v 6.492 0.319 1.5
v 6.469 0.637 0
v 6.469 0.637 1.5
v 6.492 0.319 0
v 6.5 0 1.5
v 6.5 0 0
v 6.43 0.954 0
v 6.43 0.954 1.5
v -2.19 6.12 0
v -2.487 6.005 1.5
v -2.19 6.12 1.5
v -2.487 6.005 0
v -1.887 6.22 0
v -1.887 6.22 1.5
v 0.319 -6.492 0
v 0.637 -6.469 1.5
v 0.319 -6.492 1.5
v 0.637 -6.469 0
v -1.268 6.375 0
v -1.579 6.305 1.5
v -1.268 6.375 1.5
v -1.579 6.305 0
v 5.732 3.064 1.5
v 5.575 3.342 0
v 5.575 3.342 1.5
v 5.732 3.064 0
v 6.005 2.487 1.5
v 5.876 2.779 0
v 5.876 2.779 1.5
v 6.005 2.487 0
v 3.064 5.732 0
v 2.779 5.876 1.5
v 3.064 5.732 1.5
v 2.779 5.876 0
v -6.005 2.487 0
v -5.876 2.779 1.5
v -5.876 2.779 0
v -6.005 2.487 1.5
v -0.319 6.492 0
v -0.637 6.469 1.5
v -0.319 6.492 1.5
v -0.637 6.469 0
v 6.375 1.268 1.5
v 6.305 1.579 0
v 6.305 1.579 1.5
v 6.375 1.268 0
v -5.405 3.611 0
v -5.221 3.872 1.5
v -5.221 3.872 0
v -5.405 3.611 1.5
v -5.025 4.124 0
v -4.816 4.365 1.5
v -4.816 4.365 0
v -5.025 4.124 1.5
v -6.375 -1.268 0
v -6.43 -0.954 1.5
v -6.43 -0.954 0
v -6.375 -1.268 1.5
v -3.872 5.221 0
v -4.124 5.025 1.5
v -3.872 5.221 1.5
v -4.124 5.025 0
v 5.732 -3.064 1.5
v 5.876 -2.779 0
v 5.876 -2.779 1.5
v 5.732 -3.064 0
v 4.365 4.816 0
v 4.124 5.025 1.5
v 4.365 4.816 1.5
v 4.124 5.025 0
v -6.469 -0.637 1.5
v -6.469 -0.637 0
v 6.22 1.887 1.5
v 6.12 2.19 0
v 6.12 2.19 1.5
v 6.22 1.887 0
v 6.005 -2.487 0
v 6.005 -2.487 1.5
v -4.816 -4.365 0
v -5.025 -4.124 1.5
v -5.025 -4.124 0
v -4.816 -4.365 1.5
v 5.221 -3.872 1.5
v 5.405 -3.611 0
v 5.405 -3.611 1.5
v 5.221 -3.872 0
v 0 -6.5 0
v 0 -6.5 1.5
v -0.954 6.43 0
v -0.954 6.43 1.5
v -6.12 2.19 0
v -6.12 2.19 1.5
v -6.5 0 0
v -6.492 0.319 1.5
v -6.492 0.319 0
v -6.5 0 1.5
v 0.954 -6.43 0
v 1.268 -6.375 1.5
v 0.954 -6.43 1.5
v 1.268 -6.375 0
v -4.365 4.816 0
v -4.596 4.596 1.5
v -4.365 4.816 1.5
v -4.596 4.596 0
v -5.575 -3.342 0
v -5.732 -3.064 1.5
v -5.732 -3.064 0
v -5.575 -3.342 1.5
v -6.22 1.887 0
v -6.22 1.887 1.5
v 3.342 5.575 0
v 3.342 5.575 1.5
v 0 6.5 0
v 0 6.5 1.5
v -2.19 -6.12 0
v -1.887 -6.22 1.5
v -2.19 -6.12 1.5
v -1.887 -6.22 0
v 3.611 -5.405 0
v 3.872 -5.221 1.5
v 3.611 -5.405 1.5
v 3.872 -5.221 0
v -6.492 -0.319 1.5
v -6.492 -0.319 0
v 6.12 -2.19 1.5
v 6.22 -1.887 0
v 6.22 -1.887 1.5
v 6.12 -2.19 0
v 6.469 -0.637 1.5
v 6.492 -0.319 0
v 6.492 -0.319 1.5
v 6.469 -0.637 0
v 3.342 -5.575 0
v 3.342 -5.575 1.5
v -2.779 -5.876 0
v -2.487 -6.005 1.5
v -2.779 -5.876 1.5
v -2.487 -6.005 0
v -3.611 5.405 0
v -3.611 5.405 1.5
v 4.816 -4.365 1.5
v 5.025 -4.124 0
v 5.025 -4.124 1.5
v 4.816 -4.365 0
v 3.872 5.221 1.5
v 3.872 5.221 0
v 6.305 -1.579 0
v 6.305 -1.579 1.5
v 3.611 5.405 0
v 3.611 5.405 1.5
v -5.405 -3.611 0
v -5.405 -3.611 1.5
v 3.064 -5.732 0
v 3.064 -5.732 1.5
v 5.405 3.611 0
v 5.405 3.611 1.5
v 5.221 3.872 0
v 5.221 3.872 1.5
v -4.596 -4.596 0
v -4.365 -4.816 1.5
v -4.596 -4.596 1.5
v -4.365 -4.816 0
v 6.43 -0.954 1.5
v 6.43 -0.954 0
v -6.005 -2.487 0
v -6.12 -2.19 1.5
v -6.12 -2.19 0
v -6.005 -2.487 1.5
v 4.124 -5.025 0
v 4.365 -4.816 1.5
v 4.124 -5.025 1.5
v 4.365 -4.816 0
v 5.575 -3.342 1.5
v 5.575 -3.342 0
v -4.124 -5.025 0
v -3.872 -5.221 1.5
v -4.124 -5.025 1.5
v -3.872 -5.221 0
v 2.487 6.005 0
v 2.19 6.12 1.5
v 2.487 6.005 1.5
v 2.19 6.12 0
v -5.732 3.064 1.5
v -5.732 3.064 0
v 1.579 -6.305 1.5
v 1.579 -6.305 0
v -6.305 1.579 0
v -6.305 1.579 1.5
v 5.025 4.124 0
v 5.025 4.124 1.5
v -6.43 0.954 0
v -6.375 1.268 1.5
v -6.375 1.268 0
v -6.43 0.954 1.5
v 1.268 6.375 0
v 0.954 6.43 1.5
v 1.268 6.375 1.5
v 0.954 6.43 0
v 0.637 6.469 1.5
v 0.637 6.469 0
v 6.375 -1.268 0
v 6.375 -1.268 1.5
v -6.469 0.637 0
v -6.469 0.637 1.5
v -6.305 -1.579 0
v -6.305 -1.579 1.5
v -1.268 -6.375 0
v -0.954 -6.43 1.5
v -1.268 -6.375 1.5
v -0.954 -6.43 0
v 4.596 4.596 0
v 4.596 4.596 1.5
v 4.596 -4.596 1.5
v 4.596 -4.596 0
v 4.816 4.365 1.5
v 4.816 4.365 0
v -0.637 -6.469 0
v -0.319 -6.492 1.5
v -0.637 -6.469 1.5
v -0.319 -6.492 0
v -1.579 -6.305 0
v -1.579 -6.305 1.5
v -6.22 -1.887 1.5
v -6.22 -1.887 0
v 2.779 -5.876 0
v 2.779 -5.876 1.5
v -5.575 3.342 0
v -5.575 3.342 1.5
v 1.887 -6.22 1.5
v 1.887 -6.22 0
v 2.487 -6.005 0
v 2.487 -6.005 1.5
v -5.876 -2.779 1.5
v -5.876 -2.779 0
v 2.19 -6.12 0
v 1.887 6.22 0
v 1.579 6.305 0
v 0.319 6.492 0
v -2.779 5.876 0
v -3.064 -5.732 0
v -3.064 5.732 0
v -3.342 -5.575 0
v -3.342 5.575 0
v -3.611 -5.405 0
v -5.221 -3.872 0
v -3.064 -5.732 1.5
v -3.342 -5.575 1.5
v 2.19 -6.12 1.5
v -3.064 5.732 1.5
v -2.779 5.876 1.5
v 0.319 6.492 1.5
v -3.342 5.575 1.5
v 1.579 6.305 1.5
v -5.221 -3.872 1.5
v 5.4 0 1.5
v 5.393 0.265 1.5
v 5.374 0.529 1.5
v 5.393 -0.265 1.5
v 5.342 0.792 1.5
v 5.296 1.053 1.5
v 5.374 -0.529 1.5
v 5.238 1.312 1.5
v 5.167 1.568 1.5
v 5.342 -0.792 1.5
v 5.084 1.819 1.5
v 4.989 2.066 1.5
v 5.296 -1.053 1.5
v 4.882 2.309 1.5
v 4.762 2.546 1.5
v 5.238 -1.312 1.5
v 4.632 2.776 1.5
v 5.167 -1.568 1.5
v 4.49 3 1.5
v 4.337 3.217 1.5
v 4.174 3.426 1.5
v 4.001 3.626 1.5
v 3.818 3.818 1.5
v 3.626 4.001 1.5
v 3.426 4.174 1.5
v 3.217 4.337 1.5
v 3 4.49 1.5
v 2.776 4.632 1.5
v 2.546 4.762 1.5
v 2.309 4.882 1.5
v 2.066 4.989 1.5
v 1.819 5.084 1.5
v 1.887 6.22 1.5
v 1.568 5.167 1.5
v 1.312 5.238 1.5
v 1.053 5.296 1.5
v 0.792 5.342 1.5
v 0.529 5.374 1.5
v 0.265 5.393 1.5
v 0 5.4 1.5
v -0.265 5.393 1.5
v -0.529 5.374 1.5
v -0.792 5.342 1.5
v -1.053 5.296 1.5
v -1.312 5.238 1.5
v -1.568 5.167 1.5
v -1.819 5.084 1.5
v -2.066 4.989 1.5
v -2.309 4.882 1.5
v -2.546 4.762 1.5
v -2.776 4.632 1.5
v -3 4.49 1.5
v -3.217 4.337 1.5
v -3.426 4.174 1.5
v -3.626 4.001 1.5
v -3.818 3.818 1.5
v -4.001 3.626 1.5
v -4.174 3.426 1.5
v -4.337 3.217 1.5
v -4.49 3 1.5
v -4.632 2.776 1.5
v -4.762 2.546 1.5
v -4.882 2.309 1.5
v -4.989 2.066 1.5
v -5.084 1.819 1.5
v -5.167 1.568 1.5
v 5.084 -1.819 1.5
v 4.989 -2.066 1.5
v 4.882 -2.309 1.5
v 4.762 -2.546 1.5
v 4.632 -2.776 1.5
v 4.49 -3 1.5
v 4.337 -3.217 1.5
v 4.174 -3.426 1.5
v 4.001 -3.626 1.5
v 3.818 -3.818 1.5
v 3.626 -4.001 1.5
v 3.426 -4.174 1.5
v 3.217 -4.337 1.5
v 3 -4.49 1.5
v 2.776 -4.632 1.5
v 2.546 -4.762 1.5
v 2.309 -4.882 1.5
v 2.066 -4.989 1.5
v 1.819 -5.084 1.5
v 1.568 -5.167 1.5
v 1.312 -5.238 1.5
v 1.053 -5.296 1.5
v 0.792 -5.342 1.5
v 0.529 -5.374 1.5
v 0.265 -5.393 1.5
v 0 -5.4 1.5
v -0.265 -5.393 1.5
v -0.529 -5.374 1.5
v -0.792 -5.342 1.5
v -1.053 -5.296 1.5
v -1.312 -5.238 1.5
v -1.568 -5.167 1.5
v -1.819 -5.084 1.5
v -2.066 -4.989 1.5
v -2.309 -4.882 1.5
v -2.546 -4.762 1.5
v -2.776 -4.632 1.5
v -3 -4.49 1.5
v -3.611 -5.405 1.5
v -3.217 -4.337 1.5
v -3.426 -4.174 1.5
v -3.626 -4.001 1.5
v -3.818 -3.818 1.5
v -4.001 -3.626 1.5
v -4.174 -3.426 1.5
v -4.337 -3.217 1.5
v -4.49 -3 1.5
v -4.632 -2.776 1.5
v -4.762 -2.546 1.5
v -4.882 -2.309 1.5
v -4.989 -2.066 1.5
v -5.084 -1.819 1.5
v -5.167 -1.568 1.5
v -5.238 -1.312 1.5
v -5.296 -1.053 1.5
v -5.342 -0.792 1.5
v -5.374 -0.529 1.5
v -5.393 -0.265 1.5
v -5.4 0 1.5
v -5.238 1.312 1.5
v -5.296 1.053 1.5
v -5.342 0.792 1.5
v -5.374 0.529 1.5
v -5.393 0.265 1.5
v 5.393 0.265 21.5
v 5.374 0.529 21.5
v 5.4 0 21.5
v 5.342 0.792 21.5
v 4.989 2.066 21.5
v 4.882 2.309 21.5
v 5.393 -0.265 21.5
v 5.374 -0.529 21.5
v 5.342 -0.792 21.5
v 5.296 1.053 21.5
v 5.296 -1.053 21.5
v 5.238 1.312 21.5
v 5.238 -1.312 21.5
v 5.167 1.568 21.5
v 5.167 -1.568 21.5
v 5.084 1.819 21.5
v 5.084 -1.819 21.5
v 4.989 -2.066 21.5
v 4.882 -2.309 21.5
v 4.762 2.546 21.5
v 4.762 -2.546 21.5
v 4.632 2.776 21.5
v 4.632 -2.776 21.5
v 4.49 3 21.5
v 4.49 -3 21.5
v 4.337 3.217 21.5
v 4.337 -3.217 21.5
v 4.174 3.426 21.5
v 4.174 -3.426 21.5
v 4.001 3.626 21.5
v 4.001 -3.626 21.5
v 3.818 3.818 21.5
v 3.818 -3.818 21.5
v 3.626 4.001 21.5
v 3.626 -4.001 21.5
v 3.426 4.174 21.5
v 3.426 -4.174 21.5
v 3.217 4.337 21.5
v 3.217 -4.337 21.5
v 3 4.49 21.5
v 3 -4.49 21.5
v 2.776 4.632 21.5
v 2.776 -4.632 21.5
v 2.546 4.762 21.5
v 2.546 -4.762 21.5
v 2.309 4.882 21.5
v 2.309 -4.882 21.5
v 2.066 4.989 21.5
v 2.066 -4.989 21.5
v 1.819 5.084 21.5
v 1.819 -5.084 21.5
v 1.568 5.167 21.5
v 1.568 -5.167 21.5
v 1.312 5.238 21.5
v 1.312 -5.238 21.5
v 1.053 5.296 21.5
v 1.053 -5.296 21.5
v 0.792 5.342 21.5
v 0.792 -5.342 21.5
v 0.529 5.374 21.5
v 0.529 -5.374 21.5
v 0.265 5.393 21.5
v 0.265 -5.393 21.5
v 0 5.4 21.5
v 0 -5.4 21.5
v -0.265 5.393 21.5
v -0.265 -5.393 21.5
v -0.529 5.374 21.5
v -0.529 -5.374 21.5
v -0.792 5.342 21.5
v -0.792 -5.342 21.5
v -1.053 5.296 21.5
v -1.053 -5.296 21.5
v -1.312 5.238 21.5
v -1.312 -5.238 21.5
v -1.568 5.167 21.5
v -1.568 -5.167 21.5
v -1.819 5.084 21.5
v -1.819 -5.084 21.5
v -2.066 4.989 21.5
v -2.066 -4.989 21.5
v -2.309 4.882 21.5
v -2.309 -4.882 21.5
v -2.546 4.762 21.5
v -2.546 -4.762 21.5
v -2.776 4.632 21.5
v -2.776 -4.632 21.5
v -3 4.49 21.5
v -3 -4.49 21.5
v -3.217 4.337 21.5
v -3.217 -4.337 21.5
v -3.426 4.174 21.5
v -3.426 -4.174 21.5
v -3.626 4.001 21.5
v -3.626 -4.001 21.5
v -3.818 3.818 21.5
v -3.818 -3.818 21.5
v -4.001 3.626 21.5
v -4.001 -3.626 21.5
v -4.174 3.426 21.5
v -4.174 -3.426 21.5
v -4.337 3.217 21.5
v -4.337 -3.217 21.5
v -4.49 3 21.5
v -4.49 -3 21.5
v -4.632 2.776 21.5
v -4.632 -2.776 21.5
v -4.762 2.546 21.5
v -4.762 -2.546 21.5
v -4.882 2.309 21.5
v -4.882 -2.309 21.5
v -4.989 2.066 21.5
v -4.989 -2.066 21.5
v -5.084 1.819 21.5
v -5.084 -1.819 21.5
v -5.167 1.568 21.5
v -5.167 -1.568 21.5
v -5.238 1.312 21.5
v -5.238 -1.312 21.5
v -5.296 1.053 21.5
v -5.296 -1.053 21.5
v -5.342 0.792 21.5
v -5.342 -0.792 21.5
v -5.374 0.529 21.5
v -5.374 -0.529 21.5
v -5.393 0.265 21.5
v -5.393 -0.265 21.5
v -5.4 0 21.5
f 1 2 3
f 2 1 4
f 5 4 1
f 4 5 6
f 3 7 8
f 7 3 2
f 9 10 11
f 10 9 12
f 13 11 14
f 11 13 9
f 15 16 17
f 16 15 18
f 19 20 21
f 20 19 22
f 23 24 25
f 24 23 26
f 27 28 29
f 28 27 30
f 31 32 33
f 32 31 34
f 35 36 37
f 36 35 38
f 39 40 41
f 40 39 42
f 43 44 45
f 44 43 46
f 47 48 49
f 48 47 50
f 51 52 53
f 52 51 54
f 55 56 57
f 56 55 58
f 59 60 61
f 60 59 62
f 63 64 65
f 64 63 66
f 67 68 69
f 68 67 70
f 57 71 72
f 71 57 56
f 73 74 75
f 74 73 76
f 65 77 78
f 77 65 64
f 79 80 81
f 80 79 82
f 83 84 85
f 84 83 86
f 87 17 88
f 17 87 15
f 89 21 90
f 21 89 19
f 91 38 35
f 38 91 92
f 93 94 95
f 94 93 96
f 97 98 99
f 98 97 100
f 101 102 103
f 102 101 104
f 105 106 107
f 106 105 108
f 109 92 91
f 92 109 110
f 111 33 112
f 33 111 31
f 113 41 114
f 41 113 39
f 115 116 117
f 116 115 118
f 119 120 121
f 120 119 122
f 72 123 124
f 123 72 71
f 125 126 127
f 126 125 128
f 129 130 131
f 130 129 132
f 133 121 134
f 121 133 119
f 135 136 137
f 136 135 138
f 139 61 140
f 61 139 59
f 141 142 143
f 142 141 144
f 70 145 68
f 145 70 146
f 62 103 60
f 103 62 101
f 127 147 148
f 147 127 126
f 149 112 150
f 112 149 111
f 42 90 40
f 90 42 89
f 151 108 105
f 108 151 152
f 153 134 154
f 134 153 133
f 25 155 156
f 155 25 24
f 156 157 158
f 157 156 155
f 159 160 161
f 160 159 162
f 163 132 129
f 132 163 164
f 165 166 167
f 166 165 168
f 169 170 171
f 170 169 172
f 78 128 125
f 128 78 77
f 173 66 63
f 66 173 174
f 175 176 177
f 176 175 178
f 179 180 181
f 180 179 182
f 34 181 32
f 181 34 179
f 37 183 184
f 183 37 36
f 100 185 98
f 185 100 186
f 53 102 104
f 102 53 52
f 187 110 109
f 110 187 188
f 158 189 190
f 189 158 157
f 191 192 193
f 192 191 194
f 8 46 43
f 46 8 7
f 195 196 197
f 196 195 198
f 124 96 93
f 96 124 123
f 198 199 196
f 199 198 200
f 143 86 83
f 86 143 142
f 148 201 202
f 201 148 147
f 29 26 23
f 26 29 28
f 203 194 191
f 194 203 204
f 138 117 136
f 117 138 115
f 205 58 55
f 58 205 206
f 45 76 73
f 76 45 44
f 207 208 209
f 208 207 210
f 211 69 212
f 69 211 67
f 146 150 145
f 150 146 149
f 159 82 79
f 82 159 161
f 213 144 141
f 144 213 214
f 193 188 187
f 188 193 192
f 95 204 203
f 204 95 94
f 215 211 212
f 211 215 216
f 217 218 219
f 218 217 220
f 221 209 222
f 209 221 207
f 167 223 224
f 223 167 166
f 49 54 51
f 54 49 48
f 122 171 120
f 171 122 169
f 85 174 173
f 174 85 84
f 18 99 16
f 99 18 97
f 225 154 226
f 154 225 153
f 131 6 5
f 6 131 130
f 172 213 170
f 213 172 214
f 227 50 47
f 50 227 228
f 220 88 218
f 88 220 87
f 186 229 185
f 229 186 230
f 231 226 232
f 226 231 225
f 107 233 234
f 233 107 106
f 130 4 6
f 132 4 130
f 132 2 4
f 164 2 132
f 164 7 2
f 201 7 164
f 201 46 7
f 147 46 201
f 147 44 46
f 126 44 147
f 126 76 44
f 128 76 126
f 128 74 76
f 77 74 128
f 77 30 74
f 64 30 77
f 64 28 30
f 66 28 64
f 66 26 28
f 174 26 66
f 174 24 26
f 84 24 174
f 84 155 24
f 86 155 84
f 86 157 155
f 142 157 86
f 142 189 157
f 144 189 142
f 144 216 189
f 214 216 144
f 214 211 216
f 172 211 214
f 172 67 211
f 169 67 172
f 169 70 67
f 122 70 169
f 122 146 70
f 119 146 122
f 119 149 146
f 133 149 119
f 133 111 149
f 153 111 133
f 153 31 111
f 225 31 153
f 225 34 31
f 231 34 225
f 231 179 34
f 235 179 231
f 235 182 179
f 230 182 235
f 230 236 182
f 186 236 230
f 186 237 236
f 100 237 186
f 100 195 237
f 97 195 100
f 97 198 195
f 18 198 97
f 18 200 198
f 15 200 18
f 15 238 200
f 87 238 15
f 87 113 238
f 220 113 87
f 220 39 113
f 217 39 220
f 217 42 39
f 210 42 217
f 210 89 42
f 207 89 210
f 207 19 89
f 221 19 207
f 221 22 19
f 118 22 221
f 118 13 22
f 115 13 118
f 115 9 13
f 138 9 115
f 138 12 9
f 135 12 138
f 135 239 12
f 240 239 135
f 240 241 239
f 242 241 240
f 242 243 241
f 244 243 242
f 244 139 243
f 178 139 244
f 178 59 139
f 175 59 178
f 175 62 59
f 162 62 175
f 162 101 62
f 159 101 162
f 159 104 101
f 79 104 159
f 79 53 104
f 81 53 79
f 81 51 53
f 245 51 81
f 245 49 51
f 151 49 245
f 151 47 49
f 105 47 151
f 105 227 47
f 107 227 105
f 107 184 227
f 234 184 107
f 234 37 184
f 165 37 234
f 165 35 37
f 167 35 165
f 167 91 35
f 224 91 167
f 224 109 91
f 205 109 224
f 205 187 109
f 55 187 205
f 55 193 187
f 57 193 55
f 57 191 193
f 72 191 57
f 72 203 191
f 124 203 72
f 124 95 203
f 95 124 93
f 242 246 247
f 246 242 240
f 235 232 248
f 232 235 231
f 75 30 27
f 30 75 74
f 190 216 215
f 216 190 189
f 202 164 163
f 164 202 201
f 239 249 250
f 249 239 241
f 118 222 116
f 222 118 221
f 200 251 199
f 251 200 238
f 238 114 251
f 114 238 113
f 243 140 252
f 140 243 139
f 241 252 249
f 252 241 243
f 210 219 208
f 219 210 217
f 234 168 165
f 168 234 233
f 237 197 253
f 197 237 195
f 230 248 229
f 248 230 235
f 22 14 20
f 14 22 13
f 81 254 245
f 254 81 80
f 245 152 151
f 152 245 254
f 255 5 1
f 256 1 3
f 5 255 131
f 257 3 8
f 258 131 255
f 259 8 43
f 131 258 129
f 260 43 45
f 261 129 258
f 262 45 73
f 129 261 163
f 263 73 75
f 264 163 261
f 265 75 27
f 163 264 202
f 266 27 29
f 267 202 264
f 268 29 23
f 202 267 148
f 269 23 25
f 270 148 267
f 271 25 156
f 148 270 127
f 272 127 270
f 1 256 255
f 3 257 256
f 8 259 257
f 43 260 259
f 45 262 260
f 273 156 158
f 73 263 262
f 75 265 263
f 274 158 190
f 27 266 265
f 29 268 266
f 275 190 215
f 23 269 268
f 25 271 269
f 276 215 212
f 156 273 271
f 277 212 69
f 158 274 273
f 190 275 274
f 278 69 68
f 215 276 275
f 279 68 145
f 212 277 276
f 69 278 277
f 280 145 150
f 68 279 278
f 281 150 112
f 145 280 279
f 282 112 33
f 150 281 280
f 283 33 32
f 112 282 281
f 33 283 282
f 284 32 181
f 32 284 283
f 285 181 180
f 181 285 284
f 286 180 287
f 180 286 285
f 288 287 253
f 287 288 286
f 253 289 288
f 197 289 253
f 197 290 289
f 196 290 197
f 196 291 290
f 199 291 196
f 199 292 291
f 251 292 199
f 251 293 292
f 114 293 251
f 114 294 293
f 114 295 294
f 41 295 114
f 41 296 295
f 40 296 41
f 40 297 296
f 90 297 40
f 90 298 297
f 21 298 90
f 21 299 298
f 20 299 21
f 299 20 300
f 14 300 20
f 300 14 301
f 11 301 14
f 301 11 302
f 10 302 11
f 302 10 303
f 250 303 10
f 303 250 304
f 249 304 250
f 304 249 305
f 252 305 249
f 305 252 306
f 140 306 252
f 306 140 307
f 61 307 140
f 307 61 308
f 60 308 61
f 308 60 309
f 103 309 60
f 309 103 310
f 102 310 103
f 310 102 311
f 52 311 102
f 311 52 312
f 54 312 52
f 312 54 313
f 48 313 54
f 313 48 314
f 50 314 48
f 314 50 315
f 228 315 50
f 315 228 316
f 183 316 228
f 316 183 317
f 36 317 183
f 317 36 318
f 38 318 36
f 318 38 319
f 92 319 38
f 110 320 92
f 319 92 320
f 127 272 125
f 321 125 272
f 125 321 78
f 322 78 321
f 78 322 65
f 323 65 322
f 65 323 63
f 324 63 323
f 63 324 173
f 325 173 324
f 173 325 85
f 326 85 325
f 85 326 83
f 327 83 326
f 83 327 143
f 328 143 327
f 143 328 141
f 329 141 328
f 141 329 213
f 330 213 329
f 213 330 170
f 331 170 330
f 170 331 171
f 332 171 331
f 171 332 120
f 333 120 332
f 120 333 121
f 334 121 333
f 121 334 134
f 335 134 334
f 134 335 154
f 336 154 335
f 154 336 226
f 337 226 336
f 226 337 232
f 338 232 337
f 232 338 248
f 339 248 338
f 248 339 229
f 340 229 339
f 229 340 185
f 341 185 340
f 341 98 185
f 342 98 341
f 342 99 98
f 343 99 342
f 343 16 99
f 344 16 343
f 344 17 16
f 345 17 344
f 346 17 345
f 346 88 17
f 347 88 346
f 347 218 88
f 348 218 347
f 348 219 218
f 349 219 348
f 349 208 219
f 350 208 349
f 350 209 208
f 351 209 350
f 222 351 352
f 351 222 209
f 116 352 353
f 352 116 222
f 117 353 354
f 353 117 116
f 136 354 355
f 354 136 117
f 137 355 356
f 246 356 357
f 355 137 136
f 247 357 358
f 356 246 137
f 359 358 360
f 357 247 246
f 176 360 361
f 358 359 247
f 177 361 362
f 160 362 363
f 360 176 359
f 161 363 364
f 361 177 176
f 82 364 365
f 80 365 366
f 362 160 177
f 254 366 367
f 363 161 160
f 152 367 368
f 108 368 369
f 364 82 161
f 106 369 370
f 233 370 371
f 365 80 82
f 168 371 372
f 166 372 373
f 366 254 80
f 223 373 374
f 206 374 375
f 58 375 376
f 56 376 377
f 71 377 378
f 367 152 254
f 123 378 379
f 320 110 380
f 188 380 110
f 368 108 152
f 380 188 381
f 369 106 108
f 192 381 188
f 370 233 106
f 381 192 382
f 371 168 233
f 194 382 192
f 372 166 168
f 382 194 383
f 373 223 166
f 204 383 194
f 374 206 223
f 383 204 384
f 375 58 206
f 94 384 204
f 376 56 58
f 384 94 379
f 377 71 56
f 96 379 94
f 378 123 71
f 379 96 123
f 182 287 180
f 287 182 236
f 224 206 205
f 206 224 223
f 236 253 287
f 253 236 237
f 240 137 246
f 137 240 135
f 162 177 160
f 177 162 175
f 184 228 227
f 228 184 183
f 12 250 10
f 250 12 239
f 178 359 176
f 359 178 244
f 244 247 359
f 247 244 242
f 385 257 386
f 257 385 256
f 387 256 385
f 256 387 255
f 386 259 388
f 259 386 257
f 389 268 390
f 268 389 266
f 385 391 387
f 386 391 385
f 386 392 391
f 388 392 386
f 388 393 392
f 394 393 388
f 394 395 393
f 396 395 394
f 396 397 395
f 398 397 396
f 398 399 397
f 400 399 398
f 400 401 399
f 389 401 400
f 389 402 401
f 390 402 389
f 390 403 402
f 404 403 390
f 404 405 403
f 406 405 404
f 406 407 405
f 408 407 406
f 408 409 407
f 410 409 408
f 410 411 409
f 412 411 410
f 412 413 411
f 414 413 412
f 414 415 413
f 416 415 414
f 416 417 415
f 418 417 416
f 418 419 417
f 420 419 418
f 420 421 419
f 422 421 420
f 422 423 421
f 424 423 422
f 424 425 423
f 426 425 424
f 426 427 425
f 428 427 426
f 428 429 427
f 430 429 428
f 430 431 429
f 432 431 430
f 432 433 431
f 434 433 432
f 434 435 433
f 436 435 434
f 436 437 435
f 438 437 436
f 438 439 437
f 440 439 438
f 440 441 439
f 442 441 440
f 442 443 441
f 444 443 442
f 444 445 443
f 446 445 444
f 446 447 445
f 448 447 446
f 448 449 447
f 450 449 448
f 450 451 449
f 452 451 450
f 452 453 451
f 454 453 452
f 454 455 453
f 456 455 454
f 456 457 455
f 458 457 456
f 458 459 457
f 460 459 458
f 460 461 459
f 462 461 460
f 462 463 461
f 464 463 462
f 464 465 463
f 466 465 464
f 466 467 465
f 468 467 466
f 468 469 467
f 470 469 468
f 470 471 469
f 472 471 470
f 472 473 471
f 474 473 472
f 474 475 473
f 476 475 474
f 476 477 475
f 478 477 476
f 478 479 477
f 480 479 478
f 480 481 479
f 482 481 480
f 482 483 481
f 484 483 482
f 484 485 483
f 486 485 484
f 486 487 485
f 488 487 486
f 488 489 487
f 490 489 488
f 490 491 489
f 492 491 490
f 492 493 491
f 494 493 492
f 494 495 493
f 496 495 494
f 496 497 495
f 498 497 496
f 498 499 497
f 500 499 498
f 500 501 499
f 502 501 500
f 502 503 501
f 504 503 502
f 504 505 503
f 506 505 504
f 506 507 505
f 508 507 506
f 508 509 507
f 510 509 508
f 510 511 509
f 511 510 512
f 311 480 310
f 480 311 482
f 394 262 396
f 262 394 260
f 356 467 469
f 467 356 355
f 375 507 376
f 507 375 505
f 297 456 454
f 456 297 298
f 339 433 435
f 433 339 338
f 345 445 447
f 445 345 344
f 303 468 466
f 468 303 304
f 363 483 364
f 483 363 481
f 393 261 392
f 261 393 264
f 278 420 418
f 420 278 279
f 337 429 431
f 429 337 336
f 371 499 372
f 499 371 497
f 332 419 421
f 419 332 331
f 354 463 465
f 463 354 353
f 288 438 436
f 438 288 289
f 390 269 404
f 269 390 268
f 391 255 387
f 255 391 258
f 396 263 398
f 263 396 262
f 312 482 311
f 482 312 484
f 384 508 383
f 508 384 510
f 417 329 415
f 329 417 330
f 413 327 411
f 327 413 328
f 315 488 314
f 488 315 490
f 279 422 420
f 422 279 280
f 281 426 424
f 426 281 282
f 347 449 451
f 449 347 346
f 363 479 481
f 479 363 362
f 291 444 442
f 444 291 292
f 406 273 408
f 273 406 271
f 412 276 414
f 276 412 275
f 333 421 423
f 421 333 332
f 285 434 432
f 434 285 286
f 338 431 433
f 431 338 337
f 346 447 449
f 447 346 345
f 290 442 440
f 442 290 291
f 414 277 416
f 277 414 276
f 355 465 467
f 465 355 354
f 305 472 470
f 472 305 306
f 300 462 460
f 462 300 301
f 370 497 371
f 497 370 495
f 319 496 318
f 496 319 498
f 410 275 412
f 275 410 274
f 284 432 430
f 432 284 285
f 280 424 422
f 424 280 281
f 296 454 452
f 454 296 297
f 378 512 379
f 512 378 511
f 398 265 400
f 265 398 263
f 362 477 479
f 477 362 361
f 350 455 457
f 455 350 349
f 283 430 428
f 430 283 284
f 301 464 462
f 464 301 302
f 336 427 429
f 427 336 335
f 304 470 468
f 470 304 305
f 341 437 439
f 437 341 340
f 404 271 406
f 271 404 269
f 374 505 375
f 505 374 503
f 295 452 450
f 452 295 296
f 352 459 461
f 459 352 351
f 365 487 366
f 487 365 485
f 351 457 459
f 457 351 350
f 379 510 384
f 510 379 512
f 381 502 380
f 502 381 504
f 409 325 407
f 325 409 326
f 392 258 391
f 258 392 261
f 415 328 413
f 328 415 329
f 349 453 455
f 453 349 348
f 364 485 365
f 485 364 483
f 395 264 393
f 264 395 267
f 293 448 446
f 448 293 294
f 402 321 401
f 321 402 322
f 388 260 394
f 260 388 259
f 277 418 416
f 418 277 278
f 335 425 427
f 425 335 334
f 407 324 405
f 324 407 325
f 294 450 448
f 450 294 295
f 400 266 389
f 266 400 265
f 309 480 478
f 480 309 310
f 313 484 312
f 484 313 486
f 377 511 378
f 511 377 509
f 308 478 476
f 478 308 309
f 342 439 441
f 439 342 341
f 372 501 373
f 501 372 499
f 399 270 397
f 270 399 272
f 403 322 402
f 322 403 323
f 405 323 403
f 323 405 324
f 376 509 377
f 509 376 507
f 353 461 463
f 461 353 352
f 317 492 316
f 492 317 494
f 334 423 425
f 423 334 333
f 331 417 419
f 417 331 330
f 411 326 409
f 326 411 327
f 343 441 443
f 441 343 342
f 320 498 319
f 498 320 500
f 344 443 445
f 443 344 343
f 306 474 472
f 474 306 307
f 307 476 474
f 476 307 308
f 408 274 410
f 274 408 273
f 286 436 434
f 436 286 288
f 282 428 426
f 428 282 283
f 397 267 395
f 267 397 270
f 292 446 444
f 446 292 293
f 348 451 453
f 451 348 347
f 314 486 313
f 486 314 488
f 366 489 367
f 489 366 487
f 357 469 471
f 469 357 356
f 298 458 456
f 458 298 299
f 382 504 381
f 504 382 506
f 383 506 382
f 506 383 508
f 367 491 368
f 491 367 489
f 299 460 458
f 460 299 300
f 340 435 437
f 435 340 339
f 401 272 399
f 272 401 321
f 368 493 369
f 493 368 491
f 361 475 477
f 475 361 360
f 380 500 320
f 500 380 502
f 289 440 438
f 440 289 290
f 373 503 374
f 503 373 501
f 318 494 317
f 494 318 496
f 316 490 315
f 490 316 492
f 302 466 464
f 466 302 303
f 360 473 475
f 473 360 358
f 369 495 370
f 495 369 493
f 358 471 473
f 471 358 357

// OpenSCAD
// Adapter Sleeve for 0.2mL PCR tube in 1.5mL rack
// Print orientation: Upside down (Collar on bed)
// Units: mm

// Dimensions
$fn = 128; // High resolution for smooth cylinders

// Collar (Base)
$collar_outer_d = 13;
$collar_thickness = 1.5;

// Sleeve Body
$sleeve_outer_d = 10.8;
$sleeve_total_height = 21.5;

// Bore
$bore_diameter = 6.2;

// Offset for cutting operations (Rule 5)
$cut_offset = 0.1;

// Calculate radii
$r_collar_outer = $collar_outer_d / 2;
$r_collar_inner = $collar_outer_d / 2 - $cut_offset; // Slightly smaller to ensure clean cut

$r_sleeve_outer = $sleeve_outer_d / 2;
$r_sleeve_inner = $bore_diameter / 2;

// Build the part
// 1. Create the Collar (Base)
// Lies on XY plane from z=0 to z=1.5
difference() {
    // Outer shape of collar
    cylinder(
        h = $collar_thickness,
        d = $collar_outer_d,
        center = [0, 0, $collar_thickness / 2]
    );
    
    // Inner hole for the bore (extends through the collar)
    cylinder(
        h = $collar_thickness + $cut_offset, // Extend slightly past top face
        d = $bore_diameter,
        center = [0, 0, $collar_thickness / 2]
    );
}

// 2. Create the Sleeve Body
// Rises from z=1.5 to z=21.5 (Total height 21.5, but collar takes 1.5, so body height is 20.0)
// However, the prompt says "rises from the collar to z = 21.5". 
// If collar is 0 to 1.5, the body starts at 1.5 and ends at 21.5. Height = 20.0.
// The bore must run through the FULL height (0 to 21.5).

difference() {
    // Outer shape of sleeve body
    translate([0, 0, $collar_thickness]) {
        cylinder(
            h = $sleeve_total_height - $collar_thickness,
            d = $sleeve_outer_d,
            center = [0, 0, ($sleeve_total_height - $collar_thickness) / 2 + $collar_thickness]
        );
    }
    
    // Inner hole for the bore (extends through the entire sleeve body)
    translate([0, 0, $collar_thickness]) {
        cylinder(
            h = $sleeve_total_height - $collar_thickness,
            d = $bore_diameter,
            center = [0, 0, ($sleeve_total_height - $collar_thickness) / 2 + $collar_thickness]
        );
    }
}

// 3. Combine Collar and Body with a single Bore through everything
// To ensure the bore is perfectly aligned and continuous, we will union the two solids
// and then subtract a single long cylinder for the bore.

union() {
    // Collar
    cylinder(
        h = $collar_thickness,
        d = $collar_outer_d,
        center = [0, 0, $collar_thickness / 2]
    );
    
    // Sleeve Body
    translate([0, 0, $collar_thickness]) {
        cylinder(
            h = $sleeve_total_height - $collar_thickness,
            d = $sleeve_outer_d,
            center = [0, 0, ($sleeve_total_height - $collar_thickness) / 2 + $collar_thickness]
        );
    }
}

// Subtract the full length bore
difference() {
    // Re-create the union for the subtraction context
    union() {
        cylinder(
            h = $collar_thickness,
            d = $collar_outer_d,
            center = [0, 0, $collar_thickness / 2]
        );
        
        translate([0, 0, $collar_thickness]) {
            cylinder(
                h = $sleeve_total_height - $collar_thickness,
                d = $sleeve_outer_d,
                center = [0, 0, ($sleeve_total_height - $collar_thickness) / 2 + $collar_thickness]
            );
        }
    }
    
    // Long bore cylinder
    cylinder(
        h = $sleeve_total_height,
        d = $bore_diameter,
        center = [0, 0, $sleeve_total_height / 2]
    );
}
